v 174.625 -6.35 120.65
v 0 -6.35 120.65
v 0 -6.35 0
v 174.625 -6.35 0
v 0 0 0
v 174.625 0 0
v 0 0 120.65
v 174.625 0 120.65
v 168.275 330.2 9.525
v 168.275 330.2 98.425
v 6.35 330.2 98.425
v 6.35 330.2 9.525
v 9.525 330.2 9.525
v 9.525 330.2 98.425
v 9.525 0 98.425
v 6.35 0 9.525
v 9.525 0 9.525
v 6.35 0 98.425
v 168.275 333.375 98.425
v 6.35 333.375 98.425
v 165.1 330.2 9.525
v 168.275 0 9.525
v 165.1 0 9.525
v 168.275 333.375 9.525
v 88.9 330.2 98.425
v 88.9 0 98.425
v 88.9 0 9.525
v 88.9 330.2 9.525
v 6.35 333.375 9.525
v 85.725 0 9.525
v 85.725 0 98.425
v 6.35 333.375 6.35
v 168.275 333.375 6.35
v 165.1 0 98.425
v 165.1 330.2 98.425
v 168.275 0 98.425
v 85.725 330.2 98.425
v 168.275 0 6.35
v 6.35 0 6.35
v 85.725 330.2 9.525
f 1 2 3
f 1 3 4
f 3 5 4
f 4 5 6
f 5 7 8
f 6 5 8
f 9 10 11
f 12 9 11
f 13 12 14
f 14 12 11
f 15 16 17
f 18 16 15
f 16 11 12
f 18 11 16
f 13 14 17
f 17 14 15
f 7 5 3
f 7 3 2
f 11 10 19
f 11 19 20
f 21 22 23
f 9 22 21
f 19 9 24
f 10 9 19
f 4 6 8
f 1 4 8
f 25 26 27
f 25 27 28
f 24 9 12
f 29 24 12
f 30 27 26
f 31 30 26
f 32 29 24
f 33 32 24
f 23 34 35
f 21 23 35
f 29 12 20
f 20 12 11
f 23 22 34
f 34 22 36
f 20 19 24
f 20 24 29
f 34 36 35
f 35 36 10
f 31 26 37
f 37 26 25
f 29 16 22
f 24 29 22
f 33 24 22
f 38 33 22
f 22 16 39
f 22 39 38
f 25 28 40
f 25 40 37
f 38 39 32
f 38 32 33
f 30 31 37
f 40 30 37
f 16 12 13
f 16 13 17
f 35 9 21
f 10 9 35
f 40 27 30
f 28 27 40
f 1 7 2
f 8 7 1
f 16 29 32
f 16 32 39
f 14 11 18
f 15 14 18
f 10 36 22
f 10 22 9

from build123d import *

# Parameters (mm, degrees)
F0_W      = 174.625
F0_H      = 120.65
F1_DEPTH  = 6.35
F3_W      = 330.2
F3_H      = 88.9
F4_DEPTH  = 3.175
F6_W      = 330.2
F6_H      = 88.9
F7_DEPTH  = 3.175
F8_W      = 161.925
F8_H      = 88.9
F9_DEPTH  = 3.175
F10_W     = 161.925
F10_H     = 333.375
F11_DEPTH = 3.175
F13_W     = 330.2
F13_H     = 88.9
F14_DEPTH = 1.5875


with BuildPart() as f1:
    # F0 (on Front) → F1 (new body)
    with BuildSketch(Plane.XZ):
        with Locations((87.3125, 60.325)):
            Rectangle(F0_W, F0_H)
    extrude(amount=F1_DEPTH)


with BuildPart() as f4:
    # F3 (on offset) → F4 (new body)
    with BuildSketch(Plane.YZ.offset(168.275)):
        with Locations((165.1, 53.975)):
            Rectangle(F3_W, F3_H)
    extrude(amount=-F4_DEPTH)


with BuildPart() as f7:
    # F6 (on offset) → F7 (new body)
    with BuildSketch(Plane(origin=(6.35, 0, 0), x_dir=(0, -1, 0), z_dir=(-1, 0, 0))):
        with Locations((-165.1, 53.975)):
            Rectangle(F6_W, F6_H)
    extrude(amount=-F7_DEPTH)


with BuildPart() as f9:
    # F8 (on face) → F9 (new body)
    with BuildSketch(Plane(origin=(0, 330.2, 0), x_dir=(-1, 0, 0), z_dir=(0, 1, 0))):
        with Locations((-87.3125, 53.975)):
            Rectangle(F8_W, F8_H)
    extrude(amount=F9_DEPTH)


with BuildPart() as f11:
    # F10 (on face) → F11 (new body)
    with BuildSketch(Plane(origin=(0, 0, 9.525), x_dir=(1, 0, 0), z_dir=(0, 0, -1))):
        with Locations((87.3125, -166.6875)):
            Rectangle(F10_W, F10_H)
    extrude(amount=F11_DEPTH)


with BuildPart() as f14:
    # F13 (on mid) → F14 (new body, symmetric)
    with BuildSketch(Plane.YZ.offset(87.3125)):
        with Locations((165.1, 53.975)):
            Rectangle(F13_W, F13_H)
    extrude(amount=F14_DEPTH, both=True)


solid = Compound([f1.part, f4.part, f7.part, f9.part, f11.part, f14.part])
